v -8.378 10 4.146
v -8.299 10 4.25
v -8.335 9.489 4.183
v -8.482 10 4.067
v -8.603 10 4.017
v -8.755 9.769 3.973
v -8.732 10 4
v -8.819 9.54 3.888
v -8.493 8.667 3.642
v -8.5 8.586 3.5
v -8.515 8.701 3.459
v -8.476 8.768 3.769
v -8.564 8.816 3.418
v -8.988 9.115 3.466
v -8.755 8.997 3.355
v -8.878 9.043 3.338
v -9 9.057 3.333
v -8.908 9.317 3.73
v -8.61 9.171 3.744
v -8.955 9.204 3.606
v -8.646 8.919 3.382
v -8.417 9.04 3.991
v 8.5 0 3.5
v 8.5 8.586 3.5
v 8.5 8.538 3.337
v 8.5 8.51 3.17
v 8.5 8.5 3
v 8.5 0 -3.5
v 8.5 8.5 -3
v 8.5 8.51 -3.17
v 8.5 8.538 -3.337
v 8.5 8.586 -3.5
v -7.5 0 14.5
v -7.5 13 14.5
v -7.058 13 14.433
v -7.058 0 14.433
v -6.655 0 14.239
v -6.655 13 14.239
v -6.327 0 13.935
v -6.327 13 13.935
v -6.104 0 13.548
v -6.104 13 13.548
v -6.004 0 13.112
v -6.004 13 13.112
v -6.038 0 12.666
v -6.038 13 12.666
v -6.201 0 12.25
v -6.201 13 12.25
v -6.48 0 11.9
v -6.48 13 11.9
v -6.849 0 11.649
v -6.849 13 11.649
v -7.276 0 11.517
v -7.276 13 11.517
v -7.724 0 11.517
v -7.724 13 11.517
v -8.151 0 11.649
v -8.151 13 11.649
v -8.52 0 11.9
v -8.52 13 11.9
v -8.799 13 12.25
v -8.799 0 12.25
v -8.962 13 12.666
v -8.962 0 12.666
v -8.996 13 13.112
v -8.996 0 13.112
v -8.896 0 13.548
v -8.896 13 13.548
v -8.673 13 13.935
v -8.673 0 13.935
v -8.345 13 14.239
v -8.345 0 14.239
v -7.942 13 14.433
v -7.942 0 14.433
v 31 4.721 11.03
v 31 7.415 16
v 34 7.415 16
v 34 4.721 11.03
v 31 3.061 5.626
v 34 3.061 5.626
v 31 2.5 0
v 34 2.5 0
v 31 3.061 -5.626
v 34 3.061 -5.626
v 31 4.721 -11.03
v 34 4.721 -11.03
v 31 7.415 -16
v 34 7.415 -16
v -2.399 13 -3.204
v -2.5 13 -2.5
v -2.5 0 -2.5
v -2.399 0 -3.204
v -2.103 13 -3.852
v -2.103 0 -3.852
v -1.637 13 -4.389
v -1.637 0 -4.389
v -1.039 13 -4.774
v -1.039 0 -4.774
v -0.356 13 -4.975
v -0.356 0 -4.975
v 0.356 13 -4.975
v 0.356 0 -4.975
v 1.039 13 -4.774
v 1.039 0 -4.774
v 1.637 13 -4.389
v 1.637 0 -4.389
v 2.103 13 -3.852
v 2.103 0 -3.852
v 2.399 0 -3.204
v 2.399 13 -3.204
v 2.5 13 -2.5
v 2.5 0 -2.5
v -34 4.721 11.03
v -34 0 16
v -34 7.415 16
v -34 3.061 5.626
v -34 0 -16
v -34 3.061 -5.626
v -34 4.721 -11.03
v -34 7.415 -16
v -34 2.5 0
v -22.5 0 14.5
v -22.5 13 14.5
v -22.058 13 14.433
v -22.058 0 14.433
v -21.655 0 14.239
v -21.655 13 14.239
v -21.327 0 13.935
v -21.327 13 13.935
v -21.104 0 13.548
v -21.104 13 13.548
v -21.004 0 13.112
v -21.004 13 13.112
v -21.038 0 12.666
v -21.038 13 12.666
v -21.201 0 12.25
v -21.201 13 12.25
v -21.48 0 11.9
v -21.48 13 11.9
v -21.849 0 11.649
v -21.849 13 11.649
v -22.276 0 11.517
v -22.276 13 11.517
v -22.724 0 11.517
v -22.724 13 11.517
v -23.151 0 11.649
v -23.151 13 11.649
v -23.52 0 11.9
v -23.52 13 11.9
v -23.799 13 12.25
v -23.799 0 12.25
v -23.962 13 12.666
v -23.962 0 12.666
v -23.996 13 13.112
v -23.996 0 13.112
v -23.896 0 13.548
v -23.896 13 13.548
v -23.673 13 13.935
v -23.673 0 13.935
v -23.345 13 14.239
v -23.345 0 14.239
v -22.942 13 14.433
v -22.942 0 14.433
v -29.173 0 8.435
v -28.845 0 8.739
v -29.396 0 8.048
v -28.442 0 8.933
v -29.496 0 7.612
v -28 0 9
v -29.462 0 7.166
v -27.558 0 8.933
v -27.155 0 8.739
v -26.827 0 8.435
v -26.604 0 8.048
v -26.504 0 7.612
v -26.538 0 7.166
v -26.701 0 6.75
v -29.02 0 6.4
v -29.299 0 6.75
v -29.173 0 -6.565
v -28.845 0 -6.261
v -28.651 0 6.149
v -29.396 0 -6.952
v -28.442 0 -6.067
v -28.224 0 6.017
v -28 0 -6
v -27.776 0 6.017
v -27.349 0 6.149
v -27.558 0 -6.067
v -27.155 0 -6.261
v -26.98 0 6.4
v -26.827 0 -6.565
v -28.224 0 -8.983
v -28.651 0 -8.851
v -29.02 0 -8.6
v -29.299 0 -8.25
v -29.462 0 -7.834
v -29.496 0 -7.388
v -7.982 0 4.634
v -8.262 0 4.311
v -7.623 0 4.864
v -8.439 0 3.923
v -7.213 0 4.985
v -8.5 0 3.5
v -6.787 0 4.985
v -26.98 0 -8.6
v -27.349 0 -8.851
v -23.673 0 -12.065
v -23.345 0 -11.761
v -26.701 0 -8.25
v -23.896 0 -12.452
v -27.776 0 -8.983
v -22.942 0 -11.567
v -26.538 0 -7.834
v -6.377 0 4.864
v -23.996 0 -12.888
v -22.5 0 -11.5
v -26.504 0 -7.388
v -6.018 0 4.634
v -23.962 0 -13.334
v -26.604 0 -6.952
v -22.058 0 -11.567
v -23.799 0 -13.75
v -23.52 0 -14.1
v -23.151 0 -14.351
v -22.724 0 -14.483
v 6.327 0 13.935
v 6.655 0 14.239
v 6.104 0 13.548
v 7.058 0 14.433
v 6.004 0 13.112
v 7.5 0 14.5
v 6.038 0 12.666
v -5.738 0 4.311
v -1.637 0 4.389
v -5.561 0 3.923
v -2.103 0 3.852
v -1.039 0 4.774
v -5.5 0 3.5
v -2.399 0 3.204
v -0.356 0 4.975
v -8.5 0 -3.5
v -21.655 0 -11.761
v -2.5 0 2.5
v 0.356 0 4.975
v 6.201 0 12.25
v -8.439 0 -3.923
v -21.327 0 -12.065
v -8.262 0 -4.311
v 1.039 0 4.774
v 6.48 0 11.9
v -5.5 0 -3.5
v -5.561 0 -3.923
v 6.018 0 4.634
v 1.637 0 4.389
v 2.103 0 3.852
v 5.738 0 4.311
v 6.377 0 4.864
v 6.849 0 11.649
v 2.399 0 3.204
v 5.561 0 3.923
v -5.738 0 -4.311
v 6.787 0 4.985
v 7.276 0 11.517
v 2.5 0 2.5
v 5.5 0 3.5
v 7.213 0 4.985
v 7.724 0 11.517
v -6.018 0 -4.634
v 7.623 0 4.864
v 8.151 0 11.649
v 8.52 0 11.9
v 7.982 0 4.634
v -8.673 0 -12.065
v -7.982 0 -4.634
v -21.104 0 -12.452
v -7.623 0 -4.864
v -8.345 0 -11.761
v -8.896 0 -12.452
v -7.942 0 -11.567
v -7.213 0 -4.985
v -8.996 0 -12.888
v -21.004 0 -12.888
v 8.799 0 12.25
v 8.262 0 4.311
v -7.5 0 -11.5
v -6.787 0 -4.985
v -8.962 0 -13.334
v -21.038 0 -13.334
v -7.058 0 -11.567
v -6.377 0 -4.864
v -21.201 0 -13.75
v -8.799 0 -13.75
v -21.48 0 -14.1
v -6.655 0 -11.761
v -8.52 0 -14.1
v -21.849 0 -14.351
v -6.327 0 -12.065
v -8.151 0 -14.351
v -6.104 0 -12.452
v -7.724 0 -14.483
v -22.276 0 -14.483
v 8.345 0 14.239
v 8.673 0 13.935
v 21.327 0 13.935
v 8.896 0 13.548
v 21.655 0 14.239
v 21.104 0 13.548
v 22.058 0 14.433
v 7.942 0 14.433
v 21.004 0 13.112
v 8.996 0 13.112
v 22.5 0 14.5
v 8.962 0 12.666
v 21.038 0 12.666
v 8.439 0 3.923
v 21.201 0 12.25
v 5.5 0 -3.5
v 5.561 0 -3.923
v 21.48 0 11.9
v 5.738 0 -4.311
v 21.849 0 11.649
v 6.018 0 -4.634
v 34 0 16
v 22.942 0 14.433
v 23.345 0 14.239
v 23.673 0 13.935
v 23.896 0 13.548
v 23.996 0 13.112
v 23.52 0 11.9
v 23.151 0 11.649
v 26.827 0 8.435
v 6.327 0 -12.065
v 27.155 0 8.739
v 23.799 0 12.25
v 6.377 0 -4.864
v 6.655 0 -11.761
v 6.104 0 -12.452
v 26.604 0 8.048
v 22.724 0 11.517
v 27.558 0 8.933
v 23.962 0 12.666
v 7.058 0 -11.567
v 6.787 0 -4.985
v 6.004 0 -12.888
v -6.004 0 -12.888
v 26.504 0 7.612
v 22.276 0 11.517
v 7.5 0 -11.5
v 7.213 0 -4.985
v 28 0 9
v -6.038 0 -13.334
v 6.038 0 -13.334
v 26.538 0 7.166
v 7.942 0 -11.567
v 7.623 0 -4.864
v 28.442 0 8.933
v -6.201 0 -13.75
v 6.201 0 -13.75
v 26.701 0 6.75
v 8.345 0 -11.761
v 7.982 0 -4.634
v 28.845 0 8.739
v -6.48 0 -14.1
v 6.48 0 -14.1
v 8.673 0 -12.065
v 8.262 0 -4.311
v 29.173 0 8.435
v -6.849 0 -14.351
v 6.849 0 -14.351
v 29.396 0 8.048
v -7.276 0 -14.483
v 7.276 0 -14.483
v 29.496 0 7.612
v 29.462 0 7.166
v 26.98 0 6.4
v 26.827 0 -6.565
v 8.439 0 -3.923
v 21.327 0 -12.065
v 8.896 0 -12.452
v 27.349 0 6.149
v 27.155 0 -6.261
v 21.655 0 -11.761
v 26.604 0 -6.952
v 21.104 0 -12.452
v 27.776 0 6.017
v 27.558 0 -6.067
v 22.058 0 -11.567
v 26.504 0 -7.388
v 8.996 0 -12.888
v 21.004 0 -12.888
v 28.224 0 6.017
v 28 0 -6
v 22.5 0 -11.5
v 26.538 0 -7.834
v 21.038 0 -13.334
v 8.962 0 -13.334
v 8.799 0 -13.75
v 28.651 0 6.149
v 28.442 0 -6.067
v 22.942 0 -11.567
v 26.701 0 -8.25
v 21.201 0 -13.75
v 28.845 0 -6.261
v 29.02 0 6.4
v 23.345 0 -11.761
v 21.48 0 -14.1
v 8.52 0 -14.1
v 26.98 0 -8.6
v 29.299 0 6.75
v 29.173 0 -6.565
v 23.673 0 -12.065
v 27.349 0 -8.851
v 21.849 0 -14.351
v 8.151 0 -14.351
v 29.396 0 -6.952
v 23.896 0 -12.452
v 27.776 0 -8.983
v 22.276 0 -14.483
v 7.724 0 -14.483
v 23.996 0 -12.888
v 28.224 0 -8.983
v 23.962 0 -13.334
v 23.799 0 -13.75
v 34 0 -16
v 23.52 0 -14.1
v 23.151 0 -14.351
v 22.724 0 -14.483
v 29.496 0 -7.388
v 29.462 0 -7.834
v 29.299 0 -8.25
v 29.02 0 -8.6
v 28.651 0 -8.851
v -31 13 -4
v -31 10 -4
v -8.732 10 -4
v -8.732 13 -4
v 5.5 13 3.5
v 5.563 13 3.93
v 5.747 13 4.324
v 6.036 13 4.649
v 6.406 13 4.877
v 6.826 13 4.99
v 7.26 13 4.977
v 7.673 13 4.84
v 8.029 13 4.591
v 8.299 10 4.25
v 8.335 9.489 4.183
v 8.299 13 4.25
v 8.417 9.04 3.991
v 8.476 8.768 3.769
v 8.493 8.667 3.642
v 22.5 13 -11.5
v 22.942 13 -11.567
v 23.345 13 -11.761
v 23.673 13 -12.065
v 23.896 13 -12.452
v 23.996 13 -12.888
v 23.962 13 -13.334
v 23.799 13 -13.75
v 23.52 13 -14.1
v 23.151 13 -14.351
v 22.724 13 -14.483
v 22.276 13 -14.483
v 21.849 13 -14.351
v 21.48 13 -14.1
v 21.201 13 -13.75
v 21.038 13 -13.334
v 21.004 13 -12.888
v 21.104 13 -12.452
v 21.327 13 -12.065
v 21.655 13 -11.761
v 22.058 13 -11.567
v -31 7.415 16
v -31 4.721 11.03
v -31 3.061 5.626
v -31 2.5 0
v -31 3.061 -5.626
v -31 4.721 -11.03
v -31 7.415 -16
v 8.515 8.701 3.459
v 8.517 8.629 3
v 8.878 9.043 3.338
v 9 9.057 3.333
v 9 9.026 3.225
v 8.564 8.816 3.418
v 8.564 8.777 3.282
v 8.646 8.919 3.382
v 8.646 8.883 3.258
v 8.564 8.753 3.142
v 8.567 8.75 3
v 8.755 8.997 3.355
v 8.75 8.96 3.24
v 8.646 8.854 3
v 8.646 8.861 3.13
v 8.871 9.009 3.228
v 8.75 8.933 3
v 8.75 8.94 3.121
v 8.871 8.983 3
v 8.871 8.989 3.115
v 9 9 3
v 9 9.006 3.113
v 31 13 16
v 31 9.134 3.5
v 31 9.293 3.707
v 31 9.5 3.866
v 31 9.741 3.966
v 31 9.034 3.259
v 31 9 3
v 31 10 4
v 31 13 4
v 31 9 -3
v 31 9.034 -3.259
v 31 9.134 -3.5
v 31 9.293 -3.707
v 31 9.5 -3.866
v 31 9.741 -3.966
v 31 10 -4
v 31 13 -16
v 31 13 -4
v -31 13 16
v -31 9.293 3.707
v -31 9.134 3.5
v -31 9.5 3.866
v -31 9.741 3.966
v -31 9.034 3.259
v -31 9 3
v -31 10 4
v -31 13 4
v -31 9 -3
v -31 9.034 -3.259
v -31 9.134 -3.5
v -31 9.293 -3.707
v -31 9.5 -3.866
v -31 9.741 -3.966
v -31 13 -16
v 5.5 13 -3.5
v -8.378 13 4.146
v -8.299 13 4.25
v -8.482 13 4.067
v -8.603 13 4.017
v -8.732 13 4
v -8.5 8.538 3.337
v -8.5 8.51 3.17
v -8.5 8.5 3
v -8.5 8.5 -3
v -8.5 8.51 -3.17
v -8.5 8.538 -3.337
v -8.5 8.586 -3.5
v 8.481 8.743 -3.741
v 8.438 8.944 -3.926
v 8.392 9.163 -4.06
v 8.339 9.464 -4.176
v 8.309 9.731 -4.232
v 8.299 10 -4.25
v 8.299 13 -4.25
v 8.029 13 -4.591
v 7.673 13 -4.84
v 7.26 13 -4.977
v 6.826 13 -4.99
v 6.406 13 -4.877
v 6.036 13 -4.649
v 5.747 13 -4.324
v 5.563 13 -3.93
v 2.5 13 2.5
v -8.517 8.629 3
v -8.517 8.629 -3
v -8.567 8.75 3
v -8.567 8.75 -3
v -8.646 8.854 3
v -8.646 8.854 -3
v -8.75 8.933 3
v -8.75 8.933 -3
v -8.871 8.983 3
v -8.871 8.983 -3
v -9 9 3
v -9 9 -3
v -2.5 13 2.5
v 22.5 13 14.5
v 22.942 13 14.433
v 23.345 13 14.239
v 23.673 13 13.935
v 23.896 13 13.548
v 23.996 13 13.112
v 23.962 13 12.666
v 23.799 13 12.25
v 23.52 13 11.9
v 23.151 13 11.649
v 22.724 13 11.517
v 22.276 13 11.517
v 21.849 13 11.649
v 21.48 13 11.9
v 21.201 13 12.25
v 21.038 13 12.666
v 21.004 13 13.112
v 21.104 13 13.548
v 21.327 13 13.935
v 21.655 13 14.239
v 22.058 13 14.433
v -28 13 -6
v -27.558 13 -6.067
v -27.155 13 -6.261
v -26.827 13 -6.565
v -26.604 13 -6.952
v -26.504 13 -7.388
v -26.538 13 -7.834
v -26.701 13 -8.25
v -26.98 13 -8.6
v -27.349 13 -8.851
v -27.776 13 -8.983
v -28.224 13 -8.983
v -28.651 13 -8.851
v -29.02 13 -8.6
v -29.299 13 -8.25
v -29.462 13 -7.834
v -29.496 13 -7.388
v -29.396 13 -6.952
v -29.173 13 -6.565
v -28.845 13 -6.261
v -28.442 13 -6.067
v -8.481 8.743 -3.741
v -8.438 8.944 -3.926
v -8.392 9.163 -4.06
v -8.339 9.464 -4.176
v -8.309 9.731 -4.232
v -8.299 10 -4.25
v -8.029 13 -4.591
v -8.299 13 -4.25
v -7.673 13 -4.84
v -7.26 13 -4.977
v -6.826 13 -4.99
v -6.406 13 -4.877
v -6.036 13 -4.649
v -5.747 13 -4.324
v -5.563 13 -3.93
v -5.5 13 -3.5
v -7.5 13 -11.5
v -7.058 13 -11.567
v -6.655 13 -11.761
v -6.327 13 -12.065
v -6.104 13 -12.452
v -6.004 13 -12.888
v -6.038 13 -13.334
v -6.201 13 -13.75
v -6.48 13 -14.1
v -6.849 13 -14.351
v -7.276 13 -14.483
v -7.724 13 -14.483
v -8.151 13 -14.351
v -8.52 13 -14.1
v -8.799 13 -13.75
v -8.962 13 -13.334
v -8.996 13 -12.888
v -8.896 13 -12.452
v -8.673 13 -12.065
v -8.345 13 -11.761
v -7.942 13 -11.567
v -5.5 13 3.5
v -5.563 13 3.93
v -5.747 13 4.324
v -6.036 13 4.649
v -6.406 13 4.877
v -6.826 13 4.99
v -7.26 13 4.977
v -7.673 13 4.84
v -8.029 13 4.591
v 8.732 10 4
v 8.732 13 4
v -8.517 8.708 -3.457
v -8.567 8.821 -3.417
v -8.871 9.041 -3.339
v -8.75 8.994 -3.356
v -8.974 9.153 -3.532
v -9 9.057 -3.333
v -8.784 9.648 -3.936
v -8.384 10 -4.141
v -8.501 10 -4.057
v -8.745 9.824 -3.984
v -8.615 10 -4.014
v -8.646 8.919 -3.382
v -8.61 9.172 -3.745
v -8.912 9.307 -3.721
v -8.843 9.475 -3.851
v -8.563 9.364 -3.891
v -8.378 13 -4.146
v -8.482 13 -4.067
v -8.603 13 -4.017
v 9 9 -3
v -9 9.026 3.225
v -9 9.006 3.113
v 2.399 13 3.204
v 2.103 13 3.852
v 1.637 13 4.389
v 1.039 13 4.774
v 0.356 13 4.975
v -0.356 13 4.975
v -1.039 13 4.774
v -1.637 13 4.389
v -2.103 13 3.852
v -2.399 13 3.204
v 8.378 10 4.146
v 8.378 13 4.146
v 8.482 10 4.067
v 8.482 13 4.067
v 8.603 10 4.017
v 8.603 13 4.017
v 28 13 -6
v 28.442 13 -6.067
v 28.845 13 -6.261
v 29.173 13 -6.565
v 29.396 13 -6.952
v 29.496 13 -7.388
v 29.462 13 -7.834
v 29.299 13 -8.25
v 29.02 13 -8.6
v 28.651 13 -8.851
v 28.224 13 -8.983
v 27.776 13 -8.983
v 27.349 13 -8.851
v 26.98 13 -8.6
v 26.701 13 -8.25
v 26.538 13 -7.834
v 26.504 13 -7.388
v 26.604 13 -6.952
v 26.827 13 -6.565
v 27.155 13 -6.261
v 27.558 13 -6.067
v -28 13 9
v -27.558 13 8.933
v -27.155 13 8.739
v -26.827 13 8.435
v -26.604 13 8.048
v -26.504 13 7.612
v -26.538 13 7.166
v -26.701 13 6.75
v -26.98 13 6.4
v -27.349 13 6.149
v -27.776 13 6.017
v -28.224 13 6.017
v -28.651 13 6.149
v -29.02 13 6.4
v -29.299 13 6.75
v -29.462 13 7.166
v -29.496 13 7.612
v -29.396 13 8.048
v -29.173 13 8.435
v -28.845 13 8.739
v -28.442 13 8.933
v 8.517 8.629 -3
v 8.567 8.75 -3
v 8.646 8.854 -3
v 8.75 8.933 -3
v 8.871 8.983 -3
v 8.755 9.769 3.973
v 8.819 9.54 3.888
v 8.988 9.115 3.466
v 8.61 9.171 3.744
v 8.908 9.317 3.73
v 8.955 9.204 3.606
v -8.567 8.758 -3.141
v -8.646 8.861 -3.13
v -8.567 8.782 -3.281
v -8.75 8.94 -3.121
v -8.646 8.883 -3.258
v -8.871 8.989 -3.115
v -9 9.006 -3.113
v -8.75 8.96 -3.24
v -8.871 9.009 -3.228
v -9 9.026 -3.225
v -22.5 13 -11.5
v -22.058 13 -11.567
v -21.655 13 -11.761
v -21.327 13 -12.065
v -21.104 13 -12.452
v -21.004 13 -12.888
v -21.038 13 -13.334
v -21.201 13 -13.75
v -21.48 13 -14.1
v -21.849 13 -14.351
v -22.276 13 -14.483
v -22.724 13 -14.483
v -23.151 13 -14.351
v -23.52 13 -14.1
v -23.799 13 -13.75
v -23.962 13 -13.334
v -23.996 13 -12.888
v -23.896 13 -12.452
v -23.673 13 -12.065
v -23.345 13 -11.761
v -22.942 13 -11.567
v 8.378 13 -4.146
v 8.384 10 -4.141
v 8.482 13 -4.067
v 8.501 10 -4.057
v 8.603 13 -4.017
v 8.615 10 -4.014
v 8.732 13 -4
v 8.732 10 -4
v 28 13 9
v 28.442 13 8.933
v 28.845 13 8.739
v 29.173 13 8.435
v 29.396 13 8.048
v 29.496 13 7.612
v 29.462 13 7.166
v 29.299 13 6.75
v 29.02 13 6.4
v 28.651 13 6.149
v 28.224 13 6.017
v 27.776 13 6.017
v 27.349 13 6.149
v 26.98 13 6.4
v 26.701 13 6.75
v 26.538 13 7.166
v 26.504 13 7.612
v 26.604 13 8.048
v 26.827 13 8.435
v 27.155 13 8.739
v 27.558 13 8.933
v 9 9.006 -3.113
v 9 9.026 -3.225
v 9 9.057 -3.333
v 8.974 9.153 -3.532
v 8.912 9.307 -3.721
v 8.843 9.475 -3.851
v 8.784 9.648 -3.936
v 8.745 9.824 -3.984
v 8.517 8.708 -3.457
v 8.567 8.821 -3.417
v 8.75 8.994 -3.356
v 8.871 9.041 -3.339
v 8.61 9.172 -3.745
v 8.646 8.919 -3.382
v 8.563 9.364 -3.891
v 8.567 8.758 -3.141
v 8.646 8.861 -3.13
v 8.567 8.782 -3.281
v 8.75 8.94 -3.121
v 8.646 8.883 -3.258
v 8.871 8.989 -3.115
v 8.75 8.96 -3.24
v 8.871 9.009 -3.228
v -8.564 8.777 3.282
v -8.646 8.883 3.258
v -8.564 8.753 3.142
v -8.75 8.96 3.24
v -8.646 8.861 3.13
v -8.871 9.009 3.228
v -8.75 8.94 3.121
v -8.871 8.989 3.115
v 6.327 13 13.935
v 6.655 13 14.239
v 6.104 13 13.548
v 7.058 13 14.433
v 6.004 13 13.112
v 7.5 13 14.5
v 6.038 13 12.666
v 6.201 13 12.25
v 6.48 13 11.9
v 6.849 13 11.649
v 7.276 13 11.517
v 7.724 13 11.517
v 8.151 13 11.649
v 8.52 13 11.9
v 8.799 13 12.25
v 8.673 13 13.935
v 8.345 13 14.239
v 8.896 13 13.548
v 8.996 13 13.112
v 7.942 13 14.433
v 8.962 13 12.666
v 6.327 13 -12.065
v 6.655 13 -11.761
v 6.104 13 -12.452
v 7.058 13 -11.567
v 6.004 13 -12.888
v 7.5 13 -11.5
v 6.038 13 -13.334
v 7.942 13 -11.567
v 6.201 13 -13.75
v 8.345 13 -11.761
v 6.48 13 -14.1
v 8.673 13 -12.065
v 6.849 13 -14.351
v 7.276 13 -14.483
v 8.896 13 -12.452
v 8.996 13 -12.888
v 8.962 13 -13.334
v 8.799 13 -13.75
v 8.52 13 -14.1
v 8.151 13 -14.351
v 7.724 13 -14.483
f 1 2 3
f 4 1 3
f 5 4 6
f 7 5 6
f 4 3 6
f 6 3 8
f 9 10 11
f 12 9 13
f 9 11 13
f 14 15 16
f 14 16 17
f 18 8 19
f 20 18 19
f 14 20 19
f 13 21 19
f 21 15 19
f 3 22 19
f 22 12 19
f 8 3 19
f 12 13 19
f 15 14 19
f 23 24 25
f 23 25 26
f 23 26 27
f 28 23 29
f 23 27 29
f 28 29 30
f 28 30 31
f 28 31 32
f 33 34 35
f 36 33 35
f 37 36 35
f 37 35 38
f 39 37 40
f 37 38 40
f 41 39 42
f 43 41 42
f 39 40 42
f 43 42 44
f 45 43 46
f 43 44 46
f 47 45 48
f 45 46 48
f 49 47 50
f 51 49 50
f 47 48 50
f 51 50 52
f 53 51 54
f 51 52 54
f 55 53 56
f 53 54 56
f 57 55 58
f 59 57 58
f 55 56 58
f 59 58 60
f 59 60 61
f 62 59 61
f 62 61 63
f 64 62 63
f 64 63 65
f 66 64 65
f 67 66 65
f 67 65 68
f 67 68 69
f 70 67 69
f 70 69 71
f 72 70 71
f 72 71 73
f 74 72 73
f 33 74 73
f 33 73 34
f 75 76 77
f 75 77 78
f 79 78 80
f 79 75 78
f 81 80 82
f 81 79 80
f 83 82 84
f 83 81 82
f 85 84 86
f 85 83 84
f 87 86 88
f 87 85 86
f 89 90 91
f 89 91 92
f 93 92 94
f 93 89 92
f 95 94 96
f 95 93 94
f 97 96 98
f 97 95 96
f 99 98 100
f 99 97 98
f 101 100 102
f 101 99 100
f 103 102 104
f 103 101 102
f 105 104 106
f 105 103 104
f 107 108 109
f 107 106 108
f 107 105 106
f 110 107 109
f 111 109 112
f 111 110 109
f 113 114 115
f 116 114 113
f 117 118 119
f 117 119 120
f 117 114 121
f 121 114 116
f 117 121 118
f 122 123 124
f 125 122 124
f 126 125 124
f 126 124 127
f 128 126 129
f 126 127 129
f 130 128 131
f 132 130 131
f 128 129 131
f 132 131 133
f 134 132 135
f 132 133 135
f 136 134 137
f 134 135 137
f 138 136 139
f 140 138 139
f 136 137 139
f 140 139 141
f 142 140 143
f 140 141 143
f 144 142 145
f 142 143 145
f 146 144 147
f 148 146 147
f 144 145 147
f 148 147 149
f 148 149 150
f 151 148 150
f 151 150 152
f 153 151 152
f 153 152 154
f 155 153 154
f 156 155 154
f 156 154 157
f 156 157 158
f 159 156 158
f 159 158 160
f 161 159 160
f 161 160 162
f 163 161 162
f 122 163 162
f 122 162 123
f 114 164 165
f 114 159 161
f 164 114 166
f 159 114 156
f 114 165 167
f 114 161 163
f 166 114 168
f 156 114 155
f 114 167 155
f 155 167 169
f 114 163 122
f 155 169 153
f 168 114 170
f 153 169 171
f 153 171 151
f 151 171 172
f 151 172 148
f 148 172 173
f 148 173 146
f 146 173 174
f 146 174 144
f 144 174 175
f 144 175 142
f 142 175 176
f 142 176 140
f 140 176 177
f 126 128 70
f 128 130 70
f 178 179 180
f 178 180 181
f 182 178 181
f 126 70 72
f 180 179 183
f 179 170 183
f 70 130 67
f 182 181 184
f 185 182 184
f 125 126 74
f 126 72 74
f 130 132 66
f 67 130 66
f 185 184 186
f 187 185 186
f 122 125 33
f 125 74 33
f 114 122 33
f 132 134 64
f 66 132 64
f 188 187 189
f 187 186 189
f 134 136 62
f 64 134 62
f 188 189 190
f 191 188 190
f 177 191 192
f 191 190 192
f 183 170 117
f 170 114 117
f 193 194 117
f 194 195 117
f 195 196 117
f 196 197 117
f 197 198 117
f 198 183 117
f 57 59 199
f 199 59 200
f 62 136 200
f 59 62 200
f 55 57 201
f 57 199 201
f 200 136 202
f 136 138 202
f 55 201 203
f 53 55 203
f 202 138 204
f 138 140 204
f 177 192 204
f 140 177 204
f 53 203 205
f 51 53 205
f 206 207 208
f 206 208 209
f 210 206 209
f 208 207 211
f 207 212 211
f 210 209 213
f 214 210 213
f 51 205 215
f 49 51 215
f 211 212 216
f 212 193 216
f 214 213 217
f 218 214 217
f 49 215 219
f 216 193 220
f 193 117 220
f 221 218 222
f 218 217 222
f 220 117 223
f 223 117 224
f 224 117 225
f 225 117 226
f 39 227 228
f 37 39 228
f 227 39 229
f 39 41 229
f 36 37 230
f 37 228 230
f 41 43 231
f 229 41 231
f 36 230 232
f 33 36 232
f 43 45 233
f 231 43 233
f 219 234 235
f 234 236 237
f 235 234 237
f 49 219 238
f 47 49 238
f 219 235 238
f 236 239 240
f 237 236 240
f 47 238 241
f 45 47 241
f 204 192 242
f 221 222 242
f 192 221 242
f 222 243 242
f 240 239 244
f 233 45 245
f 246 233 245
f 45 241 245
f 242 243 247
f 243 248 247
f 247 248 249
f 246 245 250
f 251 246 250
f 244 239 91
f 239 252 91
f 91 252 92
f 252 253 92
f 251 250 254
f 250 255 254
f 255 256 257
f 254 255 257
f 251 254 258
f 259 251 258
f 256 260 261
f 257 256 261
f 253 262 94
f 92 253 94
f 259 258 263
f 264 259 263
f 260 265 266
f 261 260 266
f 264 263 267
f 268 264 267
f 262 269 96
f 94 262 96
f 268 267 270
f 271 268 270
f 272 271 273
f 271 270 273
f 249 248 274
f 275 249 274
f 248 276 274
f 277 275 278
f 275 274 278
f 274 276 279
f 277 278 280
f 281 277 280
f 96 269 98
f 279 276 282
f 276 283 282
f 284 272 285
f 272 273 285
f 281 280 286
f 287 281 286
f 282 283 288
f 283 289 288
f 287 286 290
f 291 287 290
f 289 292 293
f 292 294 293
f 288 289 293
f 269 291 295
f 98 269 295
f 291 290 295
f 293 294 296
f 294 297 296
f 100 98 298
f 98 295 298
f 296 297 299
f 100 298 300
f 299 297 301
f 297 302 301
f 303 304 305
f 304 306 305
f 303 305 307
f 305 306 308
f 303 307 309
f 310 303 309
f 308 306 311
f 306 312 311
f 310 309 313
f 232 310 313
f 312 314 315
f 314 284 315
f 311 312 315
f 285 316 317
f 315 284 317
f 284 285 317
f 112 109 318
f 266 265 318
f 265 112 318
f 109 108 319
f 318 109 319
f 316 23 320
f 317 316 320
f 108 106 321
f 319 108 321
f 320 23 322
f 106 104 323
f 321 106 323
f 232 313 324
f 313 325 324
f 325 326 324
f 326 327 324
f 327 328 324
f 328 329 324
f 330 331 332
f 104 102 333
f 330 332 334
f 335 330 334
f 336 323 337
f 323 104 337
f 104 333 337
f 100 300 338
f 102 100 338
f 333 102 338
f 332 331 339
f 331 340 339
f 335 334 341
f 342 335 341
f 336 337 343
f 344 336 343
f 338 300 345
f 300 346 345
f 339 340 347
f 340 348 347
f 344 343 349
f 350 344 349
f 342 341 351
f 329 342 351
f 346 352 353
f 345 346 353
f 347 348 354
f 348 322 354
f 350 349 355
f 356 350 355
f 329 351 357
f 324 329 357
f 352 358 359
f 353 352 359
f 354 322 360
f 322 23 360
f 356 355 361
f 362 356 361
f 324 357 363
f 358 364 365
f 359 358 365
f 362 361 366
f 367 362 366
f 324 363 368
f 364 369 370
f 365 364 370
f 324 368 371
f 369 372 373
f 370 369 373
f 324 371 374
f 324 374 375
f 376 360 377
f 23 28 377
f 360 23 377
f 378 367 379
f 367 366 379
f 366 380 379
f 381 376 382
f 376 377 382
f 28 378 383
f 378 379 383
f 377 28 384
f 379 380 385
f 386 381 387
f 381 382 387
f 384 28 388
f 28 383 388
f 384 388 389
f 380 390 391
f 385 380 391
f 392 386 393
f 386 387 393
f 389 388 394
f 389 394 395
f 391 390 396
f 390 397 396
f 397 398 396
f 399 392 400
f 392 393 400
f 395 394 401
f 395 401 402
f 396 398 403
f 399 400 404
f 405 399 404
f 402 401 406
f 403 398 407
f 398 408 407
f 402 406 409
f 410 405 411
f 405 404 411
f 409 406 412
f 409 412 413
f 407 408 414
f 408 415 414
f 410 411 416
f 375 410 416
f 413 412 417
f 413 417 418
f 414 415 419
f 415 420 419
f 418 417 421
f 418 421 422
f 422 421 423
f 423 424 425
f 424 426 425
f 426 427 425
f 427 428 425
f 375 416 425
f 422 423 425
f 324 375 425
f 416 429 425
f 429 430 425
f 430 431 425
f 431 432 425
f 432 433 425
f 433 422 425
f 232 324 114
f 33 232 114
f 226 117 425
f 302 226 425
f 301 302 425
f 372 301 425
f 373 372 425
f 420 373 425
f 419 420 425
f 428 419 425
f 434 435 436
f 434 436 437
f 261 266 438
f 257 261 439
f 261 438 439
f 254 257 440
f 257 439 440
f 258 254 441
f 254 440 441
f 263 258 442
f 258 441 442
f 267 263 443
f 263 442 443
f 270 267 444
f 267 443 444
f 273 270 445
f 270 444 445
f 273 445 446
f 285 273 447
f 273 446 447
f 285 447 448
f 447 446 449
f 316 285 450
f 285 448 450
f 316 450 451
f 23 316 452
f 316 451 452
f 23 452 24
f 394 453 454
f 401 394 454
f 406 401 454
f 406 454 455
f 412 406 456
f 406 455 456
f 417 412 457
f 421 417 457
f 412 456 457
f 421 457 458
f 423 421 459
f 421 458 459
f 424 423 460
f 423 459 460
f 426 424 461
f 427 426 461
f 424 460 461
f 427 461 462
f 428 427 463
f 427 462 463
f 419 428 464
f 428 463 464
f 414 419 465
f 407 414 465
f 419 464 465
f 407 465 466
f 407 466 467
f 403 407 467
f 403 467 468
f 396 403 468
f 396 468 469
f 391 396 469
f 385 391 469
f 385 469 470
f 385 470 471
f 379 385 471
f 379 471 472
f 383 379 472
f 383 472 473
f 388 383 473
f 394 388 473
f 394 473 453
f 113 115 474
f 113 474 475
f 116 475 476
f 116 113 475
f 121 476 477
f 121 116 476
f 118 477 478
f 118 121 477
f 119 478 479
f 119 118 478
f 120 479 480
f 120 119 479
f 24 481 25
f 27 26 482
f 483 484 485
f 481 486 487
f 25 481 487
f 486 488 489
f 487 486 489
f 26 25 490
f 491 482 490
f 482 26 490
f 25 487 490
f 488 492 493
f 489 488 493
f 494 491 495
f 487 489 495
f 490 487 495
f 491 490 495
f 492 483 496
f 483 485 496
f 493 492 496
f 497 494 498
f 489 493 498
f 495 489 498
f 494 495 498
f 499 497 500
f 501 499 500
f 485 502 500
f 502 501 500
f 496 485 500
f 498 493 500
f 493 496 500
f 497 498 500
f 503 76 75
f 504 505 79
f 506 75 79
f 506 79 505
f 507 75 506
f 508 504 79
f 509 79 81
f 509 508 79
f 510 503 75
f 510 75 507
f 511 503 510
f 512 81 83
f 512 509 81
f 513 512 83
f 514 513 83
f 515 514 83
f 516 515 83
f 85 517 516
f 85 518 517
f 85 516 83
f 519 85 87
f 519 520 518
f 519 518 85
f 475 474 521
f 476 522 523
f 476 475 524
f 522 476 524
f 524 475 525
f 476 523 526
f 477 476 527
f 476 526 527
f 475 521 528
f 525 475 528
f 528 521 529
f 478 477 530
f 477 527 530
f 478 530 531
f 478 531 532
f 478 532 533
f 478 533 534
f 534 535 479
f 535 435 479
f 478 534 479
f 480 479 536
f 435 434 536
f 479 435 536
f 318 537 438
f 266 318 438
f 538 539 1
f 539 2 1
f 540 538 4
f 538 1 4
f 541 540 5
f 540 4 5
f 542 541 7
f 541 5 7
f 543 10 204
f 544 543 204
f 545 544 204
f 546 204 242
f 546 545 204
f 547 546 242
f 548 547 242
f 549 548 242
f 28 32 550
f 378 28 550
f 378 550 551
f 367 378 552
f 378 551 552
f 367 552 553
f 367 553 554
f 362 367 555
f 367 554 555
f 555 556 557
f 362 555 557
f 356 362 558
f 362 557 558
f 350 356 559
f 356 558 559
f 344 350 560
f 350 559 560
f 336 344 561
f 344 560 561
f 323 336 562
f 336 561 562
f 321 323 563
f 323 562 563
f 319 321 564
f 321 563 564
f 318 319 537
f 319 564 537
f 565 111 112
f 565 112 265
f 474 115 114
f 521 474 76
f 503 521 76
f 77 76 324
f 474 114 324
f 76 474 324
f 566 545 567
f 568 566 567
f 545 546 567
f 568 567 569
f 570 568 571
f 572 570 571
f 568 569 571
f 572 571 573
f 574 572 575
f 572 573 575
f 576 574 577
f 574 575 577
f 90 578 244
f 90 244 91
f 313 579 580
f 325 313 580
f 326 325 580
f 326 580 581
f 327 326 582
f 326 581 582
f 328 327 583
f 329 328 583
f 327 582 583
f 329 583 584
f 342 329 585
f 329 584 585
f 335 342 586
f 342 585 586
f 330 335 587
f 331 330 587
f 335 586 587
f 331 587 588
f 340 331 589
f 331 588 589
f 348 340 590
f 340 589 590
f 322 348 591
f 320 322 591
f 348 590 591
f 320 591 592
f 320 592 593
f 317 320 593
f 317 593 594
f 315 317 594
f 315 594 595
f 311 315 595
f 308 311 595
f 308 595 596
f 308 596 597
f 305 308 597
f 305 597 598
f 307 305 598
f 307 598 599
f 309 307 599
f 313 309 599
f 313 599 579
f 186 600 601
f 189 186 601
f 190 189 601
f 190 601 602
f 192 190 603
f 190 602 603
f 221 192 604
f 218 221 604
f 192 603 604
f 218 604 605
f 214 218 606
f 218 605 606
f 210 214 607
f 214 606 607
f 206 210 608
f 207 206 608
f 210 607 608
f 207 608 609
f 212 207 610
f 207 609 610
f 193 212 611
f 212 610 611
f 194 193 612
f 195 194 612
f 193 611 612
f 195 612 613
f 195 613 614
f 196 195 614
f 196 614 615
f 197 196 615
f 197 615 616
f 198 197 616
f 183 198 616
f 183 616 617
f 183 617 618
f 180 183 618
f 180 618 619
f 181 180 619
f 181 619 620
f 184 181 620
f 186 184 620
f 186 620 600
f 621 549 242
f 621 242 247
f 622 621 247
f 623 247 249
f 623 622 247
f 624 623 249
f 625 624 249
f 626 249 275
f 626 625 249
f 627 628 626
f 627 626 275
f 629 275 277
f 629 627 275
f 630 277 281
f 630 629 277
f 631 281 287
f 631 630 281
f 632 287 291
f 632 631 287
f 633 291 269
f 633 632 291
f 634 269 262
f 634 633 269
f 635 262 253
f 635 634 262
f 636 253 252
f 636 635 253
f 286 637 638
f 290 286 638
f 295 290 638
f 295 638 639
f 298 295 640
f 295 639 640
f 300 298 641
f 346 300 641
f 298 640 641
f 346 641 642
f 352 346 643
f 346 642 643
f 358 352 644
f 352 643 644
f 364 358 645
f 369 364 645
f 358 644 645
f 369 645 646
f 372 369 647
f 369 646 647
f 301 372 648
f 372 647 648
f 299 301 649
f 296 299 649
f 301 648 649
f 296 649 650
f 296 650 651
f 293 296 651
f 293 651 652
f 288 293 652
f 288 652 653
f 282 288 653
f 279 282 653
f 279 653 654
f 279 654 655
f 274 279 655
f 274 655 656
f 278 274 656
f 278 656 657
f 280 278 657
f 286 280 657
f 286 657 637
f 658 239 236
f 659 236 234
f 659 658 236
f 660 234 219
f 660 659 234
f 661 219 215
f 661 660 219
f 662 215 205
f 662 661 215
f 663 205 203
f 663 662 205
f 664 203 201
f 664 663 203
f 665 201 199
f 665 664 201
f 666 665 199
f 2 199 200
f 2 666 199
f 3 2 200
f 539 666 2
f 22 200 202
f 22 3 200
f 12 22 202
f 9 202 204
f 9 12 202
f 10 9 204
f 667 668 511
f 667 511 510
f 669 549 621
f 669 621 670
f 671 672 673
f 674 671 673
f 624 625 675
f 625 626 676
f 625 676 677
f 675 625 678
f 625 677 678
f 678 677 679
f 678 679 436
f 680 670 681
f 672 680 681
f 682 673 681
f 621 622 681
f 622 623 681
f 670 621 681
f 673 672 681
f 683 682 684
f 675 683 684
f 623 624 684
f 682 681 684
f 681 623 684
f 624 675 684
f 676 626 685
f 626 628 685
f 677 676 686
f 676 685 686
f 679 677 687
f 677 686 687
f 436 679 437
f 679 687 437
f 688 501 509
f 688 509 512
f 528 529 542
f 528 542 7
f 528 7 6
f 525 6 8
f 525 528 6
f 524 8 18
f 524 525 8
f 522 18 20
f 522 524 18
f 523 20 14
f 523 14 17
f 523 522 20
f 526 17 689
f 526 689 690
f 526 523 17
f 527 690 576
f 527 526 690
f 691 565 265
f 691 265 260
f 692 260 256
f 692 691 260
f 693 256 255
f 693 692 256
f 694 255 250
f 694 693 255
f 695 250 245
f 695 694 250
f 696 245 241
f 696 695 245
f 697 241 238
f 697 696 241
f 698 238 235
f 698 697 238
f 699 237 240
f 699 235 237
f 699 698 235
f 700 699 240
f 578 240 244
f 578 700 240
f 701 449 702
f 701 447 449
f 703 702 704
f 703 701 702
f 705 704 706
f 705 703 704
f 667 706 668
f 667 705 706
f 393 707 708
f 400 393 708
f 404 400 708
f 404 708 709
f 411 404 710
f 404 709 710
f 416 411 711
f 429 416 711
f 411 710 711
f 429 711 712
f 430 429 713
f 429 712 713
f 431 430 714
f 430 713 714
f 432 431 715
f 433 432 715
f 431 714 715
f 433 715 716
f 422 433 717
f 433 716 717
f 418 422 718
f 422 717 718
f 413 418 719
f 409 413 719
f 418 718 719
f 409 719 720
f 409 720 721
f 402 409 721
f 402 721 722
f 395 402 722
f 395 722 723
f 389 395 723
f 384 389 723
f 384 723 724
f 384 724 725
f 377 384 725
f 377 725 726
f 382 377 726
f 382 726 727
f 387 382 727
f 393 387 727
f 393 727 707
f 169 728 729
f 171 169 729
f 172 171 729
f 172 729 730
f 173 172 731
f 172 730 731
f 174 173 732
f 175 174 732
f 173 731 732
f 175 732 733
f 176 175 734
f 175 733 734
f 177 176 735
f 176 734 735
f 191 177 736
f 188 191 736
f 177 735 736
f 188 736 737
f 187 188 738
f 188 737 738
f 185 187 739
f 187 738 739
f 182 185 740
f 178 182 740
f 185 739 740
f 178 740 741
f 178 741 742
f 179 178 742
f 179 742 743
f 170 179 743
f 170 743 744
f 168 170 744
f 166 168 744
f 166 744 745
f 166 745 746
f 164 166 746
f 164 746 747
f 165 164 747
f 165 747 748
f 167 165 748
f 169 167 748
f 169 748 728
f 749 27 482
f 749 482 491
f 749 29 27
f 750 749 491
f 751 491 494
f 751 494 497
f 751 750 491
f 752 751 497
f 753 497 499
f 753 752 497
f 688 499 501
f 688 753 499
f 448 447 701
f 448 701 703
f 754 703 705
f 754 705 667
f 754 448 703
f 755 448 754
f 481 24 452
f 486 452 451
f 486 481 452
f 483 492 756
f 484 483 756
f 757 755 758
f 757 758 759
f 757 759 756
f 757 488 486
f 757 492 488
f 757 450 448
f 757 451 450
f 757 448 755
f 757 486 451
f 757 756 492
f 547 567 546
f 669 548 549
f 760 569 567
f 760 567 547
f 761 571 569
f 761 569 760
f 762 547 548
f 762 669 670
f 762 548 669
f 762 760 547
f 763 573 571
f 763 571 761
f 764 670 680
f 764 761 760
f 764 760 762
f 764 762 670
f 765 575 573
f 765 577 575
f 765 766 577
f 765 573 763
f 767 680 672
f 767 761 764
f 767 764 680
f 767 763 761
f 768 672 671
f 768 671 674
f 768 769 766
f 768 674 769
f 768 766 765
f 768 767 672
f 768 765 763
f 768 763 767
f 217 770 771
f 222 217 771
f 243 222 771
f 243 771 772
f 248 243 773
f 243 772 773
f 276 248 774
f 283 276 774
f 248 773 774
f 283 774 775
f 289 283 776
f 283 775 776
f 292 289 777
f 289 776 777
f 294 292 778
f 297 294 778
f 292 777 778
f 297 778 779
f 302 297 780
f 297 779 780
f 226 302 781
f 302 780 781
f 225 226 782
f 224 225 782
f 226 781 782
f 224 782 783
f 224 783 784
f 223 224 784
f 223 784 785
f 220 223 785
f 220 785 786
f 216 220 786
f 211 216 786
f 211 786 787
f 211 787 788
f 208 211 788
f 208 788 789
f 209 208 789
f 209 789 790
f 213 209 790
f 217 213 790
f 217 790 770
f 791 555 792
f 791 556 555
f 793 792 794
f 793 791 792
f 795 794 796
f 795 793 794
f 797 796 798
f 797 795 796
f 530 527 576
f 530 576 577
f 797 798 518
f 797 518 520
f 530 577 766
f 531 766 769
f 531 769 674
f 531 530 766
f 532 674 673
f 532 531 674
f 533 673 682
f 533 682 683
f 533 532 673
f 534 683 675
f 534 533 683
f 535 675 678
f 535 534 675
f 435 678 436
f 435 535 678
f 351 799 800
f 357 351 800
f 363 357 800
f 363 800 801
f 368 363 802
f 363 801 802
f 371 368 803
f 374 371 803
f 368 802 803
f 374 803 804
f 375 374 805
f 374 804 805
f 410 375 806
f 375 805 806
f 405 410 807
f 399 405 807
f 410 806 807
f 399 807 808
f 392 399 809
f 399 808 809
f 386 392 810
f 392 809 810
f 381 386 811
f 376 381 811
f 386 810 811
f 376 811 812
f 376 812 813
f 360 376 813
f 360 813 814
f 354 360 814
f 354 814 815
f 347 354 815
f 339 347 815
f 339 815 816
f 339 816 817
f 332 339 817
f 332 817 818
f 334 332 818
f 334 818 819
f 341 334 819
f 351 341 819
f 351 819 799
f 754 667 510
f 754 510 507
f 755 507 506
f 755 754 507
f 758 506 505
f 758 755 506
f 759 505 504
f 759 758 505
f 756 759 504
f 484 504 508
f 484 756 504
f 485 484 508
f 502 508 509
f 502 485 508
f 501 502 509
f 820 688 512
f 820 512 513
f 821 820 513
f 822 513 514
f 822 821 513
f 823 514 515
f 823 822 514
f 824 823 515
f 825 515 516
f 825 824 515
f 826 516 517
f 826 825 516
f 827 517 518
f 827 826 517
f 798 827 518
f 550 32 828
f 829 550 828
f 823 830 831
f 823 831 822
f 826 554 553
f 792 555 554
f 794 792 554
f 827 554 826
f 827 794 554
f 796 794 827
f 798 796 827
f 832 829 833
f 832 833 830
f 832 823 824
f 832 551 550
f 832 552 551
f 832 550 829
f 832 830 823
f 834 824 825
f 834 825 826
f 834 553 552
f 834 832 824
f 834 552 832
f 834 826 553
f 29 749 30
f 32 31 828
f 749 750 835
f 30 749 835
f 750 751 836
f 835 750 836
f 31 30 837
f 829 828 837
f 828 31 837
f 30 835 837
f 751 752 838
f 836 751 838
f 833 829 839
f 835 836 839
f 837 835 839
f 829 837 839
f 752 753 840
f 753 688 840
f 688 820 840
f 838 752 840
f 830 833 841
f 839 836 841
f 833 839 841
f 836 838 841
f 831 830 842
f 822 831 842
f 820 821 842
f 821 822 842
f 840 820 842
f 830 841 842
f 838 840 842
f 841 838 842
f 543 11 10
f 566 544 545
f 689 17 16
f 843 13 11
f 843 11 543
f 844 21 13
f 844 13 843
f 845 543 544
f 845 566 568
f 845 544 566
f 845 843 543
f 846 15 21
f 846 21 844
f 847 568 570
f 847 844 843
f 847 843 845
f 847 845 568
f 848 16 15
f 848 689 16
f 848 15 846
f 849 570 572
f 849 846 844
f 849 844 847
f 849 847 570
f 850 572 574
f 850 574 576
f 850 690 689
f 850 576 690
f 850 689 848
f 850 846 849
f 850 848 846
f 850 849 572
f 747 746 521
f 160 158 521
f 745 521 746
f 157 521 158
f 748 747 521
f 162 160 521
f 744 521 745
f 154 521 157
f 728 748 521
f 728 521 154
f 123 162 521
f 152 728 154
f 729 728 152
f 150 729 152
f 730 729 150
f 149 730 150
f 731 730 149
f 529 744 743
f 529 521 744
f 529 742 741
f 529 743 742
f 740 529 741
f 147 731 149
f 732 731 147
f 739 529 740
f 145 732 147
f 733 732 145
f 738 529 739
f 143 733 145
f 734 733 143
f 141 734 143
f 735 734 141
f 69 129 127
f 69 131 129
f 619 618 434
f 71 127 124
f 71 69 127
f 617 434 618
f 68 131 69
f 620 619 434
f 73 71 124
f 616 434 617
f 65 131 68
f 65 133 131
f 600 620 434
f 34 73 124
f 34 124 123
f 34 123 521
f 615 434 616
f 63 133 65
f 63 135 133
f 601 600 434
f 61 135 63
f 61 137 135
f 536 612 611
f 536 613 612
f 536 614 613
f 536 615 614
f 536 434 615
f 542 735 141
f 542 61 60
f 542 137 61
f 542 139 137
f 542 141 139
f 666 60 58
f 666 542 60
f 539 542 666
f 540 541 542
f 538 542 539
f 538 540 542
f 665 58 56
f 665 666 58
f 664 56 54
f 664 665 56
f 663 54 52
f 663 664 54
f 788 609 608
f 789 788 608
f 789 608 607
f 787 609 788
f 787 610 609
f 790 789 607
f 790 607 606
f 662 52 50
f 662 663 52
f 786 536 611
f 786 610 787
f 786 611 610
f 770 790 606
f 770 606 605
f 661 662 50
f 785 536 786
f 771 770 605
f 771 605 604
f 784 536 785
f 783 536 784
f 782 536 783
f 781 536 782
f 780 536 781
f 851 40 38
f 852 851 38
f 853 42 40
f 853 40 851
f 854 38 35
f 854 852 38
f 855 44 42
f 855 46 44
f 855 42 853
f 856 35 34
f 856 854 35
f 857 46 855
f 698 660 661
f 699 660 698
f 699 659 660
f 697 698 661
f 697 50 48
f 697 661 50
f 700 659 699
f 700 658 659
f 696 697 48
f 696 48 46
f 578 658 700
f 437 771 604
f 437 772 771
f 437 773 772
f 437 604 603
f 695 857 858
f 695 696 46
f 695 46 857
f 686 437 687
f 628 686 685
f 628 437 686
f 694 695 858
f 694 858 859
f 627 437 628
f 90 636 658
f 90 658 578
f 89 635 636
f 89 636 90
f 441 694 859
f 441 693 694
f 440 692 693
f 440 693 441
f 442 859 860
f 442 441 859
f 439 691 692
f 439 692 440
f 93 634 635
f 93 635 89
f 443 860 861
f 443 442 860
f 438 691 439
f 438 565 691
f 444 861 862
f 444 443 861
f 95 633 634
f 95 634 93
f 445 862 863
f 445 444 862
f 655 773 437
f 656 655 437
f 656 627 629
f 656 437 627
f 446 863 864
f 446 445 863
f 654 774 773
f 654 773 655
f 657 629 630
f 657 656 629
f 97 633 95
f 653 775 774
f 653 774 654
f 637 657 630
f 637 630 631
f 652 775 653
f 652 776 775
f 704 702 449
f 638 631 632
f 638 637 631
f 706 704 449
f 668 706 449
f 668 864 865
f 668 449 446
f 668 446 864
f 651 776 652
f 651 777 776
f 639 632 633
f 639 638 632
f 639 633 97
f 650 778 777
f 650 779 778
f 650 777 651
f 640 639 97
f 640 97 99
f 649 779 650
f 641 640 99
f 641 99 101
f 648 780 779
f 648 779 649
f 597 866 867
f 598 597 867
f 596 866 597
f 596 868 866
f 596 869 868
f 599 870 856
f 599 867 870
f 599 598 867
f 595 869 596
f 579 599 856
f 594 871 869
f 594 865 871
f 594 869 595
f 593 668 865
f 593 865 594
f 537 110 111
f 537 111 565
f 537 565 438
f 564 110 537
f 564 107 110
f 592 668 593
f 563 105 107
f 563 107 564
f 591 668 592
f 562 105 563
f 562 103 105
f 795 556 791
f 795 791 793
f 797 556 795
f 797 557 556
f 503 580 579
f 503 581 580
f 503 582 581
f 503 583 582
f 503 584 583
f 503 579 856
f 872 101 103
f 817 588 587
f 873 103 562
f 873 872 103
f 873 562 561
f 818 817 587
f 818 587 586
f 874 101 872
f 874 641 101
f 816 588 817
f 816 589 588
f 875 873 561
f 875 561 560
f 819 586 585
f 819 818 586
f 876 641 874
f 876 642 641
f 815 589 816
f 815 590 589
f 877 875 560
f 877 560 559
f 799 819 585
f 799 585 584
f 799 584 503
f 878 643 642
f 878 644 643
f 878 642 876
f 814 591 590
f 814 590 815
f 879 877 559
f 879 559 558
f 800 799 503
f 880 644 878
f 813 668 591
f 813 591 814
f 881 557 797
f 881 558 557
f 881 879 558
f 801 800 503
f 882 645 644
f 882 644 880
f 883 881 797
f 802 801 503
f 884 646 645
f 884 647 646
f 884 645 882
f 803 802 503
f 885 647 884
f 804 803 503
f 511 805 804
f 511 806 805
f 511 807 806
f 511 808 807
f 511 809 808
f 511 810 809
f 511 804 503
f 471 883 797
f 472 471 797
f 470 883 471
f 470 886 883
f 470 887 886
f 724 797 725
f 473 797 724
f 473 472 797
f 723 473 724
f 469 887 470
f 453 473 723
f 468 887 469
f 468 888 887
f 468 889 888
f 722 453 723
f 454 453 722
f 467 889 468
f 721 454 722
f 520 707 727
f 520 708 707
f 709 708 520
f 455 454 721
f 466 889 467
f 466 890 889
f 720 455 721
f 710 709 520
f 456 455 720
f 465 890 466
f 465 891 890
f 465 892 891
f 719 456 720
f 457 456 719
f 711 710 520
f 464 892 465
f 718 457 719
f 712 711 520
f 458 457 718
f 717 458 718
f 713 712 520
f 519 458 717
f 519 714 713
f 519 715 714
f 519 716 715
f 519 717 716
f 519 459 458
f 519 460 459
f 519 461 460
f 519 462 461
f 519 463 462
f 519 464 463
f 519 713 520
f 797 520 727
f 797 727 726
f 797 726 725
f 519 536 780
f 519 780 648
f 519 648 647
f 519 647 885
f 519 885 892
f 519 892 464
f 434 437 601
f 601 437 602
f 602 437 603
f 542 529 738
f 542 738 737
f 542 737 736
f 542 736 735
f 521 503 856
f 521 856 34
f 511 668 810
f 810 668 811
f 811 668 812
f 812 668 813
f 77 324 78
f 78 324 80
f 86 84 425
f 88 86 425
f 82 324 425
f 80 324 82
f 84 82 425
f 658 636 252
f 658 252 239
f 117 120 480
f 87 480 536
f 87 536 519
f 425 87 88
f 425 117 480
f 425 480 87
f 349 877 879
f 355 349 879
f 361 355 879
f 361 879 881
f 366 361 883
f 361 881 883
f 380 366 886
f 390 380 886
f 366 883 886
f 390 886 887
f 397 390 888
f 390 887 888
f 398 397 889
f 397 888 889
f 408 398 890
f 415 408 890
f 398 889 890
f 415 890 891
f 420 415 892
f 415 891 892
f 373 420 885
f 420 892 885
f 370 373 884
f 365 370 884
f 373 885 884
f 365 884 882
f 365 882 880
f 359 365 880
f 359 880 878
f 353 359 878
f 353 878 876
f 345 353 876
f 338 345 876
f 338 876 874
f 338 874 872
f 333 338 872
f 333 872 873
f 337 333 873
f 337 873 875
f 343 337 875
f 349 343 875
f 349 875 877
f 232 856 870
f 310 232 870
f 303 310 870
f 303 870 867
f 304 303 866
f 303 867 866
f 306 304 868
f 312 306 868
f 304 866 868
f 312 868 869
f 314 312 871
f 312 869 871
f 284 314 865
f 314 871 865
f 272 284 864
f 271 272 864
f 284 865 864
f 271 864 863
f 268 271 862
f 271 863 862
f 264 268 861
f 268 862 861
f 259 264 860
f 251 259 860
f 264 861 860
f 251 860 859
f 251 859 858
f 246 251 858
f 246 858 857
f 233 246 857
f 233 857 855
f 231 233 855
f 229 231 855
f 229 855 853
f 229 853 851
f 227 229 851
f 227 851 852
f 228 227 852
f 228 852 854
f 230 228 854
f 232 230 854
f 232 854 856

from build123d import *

# Parameters (mm, degrees)
SKETCH1_W           = 68
SKETCH1_H           = 32
BOSS_EXTRUDE1_DEPTH = 13
SKETCH2_R           = 1.5
CUT_EXTRUDE1_DEPTH  = 40.761790704
CUT_EXTRUDE2_DEPTH  = 40.761790704
CUT_EXTRUDE3_START  = -34
CUT_EXTRUDE3_DEPTH  = 3
CUT_EXTRUDE4_START  = 31
CUT_EXTRUDE4_DEPTH  = 3
CUT_EXTRUDE5_DEPTH  = 23
CUT_EXTRUDE6_START  = -23
CUT_EXTRUDE6_DEPTH  = 23
FILLET1_R           = 0.5


with BuildPart() as part:
    # Sketch1 → Boss-Extrude1 (new body)
    with BuildSketch(Plane(origin=(0, 0, 0), x_dir=(1, 0, 0), z_dir=(0, 1, 0))):
        Rectangle(SKETCH1_W, SKETCH1_H)
    extrude(amount=BOSS_EXTRUDE1_DEPTH)

    # Sketch2 → Cut-Extrude1 (cut, through all)
    with BuildSketch(Plane(origin=(0, 13, 0), x_dir=(1, 0, 0), z_dir=(0, 1, 0))):
        with Locations(Location((-28, 7.5, 0), (0, 0, 270))):
            Circle(SKETCH2_R)
        with Locations(Location((-28, -7.5, 0), (0, 0, 270))):
            Circle(SKETCH2_R)
        with Locations(Location((28, -7.5, 0), (0, 0, 270))):
            Circle(SKETCH2_R)
        with Locations(Location((28, 7.5, 0), (0, 0, 270))):
            Circle(SKETCH2_R)
        with Locations(Location((-22.5, 13, 0), (0, 0, 270))):
            Circle(SKETCH2_R)
        with Locations(Location((-7.5, 13, 0), (0, 0, 270))):
            Circle(SKETCH2_R)
        with Locations(Location((7.5, 13, 0), (0, 0, 270))):
            Circle(SKETCH2_R)
        with Locations(Location((22.5, 13, 0), (0, 0, 270))):
            Circle(SKETCH2_R)
        with Locations(Location((-22.5, -13, 0), (0, 0, 270))):
            Circle(SKETCH2_R)
        with Locations(Location((-7.5, -13, 0), (0, 0, 270))):
            Circle(SKETCH2_R)
        with Locations(Location((7.5, -13, 0), (0, 0, 270))):
            Circle(SKETCH2_R)
        with Locations(Location((22.5, -13, 0), (0, 0, 270))):
            Circle(SKETCH2_R)
    extrude(amount=-CUT_EXTRUDE1_DEPTH, mode=Mode.SUBTRACT)

    # Sketch3 → Cut-Extrude2 (cut, through all)
    with BuildSketch(Plane(origin=(0, 13, 0), x_dir=(1, 0, 0), z_dir=(0, 1, 0))):
        with BuildLine():
            Line((-2.5, -2.5), (-2.5, 2.5))
            ThreePointArc((-2.5, 2.5), (0, 5), (2.5, 2.5))
            Line((2.5, 2.5), (2.5, -2.5))
            ThreePointArc((2.5, -2.5), (0, -5), (-2.5, -2.5))
        make_face()
        with BuildLine():
            Line((-8.5, -3.5), (-8.5, 3.5))
            ThreePointArc((-8.5, 3.5), (-7, 5), (-5.5, 3.5))
            Line((-5.5, 3.5), (-5.5, -3.5))
            ThreePointArc((-5.5, -3.5), (-7, -5), (-8.5, -3.5))
        make_face()
        with BuildLine():
            Line((8.5, -3.5), (8.5, 3.5))
            ThreePointArc((8.5, 3.5), (7, 5), (5.5, 3.5))
            Line((5.5, 3.5), (5.5, -3.5))
            ThreePointArc((5.5, -3.5), (7, -5), (8.5, -3.5))
        make_face()
    extrude(amount=-CUT_EXTRUDE2_DEPTH, mode=Mode.SUBTRACT)

    # Sketch5 → Cut-Extrude3 (cut)
    with BuildSketch(Plane(origin=(0, 0, 0), x_dir=(0, 0, -1), z_dir=(1, 0, 0)).offset(CUT_EXTRUDE3_START)):
        with BuildLine():
            Line((16, 7.41504717), (16, 13))
            Line((16, 13), (-16, 13))
            Line((-16, 13), (-16, 7.41504717))
            ThreePointArc((-16, 7.41504717), (0, 2.5), (16, 7.41504717))
        make_face()
    extrude(amount=CUT_EXTRUDE3_DEPTH, mode=Mode.SUBTRACT)

    # Sketch6 → Cut-Extrude4 (cut)
    with BuildSketch(Plane(origin=(0, 0, 0), x_dir=(0, 0, -1), z_dir=(1, 0, 0)).offset(CUT_EXTRUDE4_START)):
        with BuildLine():
            Line((16, 7.41504717), (16, 13))
            Line((16, 13), (-16, 13))
            Line((-16, 13), (-16, 7.41504717))
            ThreePointArc((-16, 7.41504717), (0, 2.5), (16, 7.41504717))
        make_face()
    extrude(amount=CUT_EXTRUDE4_DEPTH, mode=Mode.SUBTRACT)

    # Sketch7 → Cut-Extrude5 (cut)
    with BuildSketch(Plane.ZY.offset(31)):
        with BuildLine():
            Line((-4, 13), (4, 13))
            Line((4, 13), (4, 10))
            ThreePointArc((4, 10), (3.707106781, 9.292893219), (3, 9))
            Line((3, 9), (-3, 9))
            ThreePointArc((-3, 9), (-3.707106781, 9.292893219), (-4, 10))
            Line((-4, 10), (-4, 13))
        make_face()
    extrude(amount=-CUT_EXTRUDE5_DEPTH, mode=Mode.SUBTRACT)

    # Sketch8 → Cut-Extrude6 (cut)
    with BuildSketch(Plane(origin=(31, 0, 0), x_dir=(0, 0, -1), z_dir=(1, 0, 0)).offset(CUT_EXTRUDE6_START)):
        with BuildLine():
            Line((4, 13), (-4, 13))
            Line((-4, 13), (-4, 10))
            ThreePointArc((-4, 10), (-3.707106781, 9.292893219), (-3, 9))
            Line((-3, 9), (3, 9))
            ThreePointArc((3, 9), (3.707106781, 9.292893219), (4, 10))
            Line((4, 10), (4, 13))
        make_face()
    extrude(amount=CUT_EXTRUDE6_DEPTH, mode=Mode.SUBTRACT)

    # Fillet1
    fillet1_edges = [part.edges().sort_by_distance(p)[0] for p in [
        (-8.414213562, 11.5, -4),
        (-8.414213562, 11.5, 4),
        (-8.5, 9.034074174, 3.258819045),
        (-8.454681198, 9.499830019, 3.865927225),
        (-8.5, 9, 0),
        (-8.454681197, 9.499830019, -3.865927225),
        (-8.5, 9.034074174, -3.258819045),
        (8.414213562, 11.5, -4),
        (8.5, 9.034074174, -3.258819045),
        (8.454681197, 9.499830019, -3.865927225),
        (8.5, 9, 0),
        (8.454681198, 9.499830019, 3.865927225),
        (8.5, 9.034074174, 3.258819045),
        (8.414213562, 11.5, 4),
    ]]
    fillet(fillet1_edges, radius=FILLET1_R)


solid = part.part
